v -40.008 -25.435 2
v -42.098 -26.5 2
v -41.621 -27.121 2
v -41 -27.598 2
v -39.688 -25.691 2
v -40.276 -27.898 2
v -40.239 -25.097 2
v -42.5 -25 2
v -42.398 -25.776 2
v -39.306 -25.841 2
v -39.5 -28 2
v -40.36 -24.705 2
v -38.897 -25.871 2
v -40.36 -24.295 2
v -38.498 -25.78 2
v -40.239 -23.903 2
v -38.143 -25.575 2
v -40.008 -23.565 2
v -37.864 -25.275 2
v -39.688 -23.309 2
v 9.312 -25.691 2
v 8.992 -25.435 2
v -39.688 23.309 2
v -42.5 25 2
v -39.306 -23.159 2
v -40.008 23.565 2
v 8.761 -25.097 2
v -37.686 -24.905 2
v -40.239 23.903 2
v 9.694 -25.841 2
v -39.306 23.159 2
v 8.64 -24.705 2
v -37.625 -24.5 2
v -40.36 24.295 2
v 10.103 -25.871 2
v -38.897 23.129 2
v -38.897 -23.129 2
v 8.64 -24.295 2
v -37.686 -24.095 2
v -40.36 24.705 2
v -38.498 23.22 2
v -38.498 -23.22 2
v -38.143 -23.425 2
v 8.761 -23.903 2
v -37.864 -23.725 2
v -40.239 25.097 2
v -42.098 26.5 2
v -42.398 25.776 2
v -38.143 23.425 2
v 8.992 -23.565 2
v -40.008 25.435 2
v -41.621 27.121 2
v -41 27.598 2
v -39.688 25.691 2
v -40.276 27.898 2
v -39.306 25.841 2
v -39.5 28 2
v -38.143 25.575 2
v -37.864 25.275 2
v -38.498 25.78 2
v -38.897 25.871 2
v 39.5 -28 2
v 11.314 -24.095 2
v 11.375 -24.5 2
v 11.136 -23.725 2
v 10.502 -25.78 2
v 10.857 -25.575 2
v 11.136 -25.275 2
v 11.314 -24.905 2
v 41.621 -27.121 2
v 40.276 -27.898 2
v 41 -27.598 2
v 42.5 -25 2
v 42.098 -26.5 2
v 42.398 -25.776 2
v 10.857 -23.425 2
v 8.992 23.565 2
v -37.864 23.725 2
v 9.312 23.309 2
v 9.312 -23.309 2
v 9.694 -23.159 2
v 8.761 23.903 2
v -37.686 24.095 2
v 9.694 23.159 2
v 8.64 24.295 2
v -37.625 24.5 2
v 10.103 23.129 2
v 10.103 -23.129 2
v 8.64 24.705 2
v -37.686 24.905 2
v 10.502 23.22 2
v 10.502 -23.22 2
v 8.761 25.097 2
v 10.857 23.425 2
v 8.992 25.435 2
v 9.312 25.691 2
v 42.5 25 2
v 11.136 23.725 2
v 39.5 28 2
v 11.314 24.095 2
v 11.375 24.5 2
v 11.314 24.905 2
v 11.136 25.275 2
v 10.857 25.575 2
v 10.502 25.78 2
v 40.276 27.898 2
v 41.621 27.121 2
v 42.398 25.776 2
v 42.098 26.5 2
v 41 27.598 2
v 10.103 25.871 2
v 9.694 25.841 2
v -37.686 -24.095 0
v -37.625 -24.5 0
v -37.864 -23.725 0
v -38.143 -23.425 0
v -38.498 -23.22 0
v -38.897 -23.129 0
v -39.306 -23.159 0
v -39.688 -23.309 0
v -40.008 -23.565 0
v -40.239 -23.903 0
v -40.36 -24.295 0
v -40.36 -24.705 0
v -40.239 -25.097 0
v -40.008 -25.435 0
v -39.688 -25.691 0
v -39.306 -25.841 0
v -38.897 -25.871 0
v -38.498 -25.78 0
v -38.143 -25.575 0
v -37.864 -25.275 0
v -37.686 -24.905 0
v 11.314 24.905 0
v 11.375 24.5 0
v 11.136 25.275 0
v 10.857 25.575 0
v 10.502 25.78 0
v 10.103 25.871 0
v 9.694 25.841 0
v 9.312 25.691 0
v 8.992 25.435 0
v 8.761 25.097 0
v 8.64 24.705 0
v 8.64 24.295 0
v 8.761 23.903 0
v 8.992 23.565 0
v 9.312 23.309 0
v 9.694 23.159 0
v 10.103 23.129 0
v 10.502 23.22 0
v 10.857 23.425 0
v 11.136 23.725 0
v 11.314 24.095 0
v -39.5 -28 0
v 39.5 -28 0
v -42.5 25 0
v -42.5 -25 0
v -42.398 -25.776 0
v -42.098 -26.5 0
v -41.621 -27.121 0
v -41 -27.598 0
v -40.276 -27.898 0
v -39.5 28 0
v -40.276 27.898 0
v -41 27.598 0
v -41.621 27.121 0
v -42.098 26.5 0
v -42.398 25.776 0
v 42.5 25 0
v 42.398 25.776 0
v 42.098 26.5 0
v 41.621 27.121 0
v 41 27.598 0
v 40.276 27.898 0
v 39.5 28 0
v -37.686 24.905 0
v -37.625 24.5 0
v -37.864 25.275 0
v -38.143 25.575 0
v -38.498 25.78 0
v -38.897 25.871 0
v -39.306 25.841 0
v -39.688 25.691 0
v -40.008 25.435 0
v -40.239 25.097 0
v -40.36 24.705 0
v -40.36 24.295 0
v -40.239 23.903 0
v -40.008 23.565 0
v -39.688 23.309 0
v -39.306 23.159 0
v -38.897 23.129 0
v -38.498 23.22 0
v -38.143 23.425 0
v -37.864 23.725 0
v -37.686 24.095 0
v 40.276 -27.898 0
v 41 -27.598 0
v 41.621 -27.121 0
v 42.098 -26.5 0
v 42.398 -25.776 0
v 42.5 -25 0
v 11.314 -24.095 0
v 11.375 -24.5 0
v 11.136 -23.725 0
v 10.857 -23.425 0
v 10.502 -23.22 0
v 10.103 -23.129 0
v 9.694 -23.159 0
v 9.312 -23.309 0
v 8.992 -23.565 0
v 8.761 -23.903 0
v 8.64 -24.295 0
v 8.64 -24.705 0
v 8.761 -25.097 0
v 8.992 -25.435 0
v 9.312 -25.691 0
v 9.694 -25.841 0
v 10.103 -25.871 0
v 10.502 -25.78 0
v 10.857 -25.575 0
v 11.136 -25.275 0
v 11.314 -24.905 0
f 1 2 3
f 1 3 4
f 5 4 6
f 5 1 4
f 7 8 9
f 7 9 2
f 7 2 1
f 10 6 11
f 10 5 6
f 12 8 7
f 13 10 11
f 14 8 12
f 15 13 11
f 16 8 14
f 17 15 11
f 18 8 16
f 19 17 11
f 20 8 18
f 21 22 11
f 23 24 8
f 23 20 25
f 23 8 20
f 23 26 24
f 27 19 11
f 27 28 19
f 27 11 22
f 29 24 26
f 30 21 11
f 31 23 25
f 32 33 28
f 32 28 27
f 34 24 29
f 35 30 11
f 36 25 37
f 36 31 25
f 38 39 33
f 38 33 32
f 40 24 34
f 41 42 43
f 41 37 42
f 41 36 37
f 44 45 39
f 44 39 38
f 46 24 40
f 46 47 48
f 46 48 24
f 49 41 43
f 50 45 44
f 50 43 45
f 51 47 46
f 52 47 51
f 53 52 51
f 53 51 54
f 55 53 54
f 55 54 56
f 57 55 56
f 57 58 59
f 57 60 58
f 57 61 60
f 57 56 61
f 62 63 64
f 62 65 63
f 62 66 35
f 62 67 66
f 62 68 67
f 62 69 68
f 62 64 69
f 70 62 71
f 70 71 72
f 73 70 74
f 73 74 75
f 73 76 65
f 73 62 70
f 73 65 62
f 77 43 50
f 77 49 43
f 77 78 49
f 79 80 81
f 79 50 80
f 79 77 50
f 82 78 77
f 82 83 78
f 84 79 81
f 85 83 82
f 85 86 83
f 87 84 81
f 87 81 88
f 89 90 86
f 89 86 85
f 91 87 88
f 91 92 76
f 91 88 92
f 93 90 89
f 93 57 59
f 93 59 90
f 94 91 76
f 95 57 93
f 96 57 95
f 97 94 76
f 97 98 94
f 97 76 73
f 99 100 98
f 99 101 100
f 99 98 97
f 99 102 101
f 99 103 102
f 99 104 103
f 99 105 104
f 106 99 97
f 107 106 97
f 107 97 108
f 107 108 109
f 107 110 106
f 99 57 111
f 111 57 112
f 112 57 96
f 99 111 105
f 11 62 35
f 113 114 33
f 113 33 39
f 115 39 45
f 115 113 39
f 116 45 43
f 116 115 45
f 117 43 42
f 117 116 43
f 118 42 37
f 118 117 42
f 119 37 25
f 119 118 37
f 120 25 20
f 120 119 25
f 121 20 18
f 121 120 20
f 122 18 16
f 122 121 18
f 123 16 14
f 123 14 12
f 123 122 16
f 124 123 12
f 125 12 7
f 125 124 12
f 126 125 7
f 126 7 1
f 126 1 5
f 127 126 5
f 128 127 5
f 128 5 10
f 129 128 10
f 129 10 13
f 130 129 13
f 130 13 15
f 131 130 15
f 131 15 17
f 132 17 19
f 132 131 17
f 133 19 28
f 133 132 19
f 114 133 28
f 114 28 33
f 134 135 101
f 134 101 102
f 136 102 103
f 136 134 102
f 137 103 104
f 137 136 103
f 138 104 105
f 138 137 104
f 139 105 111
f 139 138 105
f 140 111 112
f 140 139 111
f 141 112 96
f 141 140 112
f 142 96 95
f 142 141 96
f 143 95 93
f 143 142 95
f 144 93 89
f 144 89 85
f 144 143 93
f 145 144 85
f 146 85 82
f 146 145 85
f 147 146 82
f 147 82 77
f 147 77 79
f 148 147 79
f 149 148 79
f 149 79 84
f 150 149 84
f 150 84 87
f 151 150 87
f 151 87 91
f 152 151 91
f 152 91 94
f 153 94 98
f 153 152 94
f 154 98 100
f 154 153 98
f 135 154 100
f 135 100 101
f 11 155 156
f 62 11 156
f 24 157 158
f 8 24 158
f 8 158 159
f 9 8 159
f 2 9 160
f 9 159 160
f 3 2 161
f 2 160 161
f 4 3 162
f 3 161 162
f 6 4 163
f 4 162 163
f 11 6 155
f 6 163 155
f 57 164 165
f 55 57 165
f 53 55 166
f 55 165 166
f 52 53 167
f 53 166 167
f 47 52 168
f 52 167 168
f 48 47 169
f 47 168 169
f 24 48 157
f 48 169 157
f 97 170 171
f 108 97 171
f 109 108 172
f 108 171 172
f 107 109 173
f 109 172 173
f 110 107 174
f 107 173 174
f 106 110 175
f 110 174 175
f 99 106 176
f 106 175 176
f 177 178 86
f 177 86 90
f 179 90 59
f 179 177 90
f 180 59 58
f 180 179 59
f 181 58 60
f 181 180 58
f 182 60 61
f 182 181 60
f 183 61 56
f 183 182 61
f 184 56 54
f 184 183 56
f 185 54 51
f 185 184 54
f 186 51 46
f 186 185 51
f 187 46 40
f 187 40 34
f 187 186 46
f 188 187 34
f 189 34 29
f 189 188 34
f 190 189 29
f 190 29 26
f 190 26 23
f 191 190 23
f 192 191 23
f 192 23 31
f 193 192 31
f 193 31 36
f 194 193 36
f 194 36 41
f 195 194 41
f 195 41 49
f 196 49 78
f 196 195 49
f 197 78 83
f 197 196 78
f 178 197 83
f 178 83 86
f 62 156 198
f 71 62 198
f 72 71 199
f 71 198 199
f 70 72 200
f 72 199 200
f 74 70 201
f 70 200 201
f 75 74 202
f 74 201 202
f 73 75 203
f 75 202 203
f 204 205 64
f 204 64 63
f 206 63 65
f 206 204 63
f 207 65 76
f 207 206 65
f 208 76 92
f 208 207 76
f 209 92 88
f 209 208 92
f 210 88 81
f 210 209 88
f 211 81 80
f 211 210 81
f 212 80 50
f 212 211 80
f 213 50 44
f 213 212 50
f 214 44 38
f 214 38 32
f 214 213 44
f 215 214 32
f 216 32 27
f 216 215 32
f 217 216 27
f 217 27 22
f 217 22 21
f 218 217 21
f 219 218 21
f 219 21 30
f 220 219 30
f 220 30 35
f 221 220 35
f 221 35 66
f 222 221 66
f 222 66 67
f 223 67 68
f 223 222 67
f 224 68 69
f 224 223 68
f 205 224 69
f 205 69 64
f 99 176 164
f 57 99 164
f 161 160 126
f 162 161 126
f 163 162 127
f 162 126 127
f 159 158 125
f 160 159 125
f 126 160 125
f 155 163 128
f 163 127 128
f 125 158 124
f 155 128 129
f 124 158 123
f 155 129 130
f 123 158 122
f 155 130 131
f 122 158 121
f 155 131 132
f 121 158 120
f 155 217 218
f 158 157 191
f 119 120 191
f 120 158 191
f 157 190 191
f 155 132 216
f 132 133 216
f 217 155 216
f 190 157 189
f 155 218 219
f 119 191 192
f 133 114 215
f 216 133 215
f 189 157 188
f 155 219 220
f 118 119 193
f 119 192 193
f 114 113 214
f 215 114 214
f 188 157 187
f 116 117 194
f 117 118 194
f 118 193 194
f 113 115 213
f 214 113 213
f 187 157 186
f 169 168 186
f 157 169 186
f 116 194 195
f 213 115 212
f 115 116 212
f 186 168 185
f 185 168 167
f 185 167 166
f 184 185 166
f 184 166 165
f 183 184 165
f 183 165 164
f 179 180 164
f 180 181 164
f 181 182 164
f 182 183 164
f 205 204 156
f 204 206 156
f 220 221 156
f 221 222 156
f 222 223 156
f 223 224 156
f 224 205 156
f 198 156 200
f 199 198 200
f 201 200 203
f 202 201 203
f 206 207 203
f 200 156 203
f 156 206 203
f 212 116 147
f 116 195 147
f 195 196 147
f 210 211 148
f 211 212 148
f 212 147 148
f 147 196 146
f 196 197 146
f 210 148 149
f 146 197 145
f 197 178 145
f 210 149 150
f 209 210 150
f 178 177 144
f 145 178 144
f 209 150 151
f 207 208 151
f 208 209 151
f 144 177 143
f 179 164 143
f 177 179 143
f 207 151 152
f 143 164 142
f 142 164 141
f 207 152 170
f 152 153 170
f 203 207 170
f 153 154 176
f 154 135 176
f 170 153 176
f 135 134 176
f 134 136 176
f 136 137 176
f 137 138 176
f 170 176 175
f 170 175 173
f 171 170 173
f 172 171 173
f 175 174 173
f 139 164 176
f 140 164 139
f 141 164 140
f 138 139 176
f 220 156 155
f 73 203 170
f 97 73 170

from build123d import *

# Parameters (mm, degrees)
F0_R     = 3.1
F0_R_2   = 1.375
F1_DEPTH = 2


with BuildPart() as f1:
    # F0 (on Top) → F1 (new body)
    with BuildSketch(Plane.XY):
        with BuildLine():
            Line((39.5, 28), (-39.5, 28))
            ThreePointArc((-39.5, 28), (-41.62132, 27.12132), (-42.5, 25))
            Line((-42.5, 25), (-42.5, -25))
            ThreePointArc((-42.5, -25), (-41.62132, -27.12132), (-39.5, -28))
            Line((-39.5, -28), (39.5, -28))
            ThreePointArc((39.5, -28), (41.62132, -27.12132), (42.5, -25))
            Line((42.5, -25), (42.5, 25))
            ThreePointArc((42.5, 25), (41.62132, 27.12132), (39.5, 28))
        make_face()
        with Locations((-39, -24.5)):
            Circle(F0_R, mode=Mode.SUBTRACT)
        with Locations((10, -24.5)):
            Circle(F0_R, mode=Mode.SUBTRACT)
        with Locations((-39, 24.5)):
            Circle(F0_R, mode=Mode.SUBTRACT)
        with Locations((10, 24.5)):
            Circle(F0_R, mode=Mode.SUBTRACT)
        with Locations((10, 24.5)):
            Circle(F0_R)
        with Locations((10, 24.5)):
            Circle(F0_R_2, mode=Mode.SUBTRACT)
        with Locations((10, -24.5)):
            Circle(F0_R)
        with Locations((10, -24.5)):
            Circle(F0_R_2, mode=Mode.SUBTRACT)
        with Locations((-39, -24.5)):
            Circle(F0_R)
        with Locations((-39, -24.5)):
            Circle(F0_R_2, mode=Mode.SUBTRACT)
        with Locations((-39, 24.5)):
            Circle(F0_R)
        with Locations((-39, 24.5)):
            Circle(F0_R_2, mode=Mode.SUBTRACT)
    extrude(amount=F1_DEPTH)


solid = f1.part
